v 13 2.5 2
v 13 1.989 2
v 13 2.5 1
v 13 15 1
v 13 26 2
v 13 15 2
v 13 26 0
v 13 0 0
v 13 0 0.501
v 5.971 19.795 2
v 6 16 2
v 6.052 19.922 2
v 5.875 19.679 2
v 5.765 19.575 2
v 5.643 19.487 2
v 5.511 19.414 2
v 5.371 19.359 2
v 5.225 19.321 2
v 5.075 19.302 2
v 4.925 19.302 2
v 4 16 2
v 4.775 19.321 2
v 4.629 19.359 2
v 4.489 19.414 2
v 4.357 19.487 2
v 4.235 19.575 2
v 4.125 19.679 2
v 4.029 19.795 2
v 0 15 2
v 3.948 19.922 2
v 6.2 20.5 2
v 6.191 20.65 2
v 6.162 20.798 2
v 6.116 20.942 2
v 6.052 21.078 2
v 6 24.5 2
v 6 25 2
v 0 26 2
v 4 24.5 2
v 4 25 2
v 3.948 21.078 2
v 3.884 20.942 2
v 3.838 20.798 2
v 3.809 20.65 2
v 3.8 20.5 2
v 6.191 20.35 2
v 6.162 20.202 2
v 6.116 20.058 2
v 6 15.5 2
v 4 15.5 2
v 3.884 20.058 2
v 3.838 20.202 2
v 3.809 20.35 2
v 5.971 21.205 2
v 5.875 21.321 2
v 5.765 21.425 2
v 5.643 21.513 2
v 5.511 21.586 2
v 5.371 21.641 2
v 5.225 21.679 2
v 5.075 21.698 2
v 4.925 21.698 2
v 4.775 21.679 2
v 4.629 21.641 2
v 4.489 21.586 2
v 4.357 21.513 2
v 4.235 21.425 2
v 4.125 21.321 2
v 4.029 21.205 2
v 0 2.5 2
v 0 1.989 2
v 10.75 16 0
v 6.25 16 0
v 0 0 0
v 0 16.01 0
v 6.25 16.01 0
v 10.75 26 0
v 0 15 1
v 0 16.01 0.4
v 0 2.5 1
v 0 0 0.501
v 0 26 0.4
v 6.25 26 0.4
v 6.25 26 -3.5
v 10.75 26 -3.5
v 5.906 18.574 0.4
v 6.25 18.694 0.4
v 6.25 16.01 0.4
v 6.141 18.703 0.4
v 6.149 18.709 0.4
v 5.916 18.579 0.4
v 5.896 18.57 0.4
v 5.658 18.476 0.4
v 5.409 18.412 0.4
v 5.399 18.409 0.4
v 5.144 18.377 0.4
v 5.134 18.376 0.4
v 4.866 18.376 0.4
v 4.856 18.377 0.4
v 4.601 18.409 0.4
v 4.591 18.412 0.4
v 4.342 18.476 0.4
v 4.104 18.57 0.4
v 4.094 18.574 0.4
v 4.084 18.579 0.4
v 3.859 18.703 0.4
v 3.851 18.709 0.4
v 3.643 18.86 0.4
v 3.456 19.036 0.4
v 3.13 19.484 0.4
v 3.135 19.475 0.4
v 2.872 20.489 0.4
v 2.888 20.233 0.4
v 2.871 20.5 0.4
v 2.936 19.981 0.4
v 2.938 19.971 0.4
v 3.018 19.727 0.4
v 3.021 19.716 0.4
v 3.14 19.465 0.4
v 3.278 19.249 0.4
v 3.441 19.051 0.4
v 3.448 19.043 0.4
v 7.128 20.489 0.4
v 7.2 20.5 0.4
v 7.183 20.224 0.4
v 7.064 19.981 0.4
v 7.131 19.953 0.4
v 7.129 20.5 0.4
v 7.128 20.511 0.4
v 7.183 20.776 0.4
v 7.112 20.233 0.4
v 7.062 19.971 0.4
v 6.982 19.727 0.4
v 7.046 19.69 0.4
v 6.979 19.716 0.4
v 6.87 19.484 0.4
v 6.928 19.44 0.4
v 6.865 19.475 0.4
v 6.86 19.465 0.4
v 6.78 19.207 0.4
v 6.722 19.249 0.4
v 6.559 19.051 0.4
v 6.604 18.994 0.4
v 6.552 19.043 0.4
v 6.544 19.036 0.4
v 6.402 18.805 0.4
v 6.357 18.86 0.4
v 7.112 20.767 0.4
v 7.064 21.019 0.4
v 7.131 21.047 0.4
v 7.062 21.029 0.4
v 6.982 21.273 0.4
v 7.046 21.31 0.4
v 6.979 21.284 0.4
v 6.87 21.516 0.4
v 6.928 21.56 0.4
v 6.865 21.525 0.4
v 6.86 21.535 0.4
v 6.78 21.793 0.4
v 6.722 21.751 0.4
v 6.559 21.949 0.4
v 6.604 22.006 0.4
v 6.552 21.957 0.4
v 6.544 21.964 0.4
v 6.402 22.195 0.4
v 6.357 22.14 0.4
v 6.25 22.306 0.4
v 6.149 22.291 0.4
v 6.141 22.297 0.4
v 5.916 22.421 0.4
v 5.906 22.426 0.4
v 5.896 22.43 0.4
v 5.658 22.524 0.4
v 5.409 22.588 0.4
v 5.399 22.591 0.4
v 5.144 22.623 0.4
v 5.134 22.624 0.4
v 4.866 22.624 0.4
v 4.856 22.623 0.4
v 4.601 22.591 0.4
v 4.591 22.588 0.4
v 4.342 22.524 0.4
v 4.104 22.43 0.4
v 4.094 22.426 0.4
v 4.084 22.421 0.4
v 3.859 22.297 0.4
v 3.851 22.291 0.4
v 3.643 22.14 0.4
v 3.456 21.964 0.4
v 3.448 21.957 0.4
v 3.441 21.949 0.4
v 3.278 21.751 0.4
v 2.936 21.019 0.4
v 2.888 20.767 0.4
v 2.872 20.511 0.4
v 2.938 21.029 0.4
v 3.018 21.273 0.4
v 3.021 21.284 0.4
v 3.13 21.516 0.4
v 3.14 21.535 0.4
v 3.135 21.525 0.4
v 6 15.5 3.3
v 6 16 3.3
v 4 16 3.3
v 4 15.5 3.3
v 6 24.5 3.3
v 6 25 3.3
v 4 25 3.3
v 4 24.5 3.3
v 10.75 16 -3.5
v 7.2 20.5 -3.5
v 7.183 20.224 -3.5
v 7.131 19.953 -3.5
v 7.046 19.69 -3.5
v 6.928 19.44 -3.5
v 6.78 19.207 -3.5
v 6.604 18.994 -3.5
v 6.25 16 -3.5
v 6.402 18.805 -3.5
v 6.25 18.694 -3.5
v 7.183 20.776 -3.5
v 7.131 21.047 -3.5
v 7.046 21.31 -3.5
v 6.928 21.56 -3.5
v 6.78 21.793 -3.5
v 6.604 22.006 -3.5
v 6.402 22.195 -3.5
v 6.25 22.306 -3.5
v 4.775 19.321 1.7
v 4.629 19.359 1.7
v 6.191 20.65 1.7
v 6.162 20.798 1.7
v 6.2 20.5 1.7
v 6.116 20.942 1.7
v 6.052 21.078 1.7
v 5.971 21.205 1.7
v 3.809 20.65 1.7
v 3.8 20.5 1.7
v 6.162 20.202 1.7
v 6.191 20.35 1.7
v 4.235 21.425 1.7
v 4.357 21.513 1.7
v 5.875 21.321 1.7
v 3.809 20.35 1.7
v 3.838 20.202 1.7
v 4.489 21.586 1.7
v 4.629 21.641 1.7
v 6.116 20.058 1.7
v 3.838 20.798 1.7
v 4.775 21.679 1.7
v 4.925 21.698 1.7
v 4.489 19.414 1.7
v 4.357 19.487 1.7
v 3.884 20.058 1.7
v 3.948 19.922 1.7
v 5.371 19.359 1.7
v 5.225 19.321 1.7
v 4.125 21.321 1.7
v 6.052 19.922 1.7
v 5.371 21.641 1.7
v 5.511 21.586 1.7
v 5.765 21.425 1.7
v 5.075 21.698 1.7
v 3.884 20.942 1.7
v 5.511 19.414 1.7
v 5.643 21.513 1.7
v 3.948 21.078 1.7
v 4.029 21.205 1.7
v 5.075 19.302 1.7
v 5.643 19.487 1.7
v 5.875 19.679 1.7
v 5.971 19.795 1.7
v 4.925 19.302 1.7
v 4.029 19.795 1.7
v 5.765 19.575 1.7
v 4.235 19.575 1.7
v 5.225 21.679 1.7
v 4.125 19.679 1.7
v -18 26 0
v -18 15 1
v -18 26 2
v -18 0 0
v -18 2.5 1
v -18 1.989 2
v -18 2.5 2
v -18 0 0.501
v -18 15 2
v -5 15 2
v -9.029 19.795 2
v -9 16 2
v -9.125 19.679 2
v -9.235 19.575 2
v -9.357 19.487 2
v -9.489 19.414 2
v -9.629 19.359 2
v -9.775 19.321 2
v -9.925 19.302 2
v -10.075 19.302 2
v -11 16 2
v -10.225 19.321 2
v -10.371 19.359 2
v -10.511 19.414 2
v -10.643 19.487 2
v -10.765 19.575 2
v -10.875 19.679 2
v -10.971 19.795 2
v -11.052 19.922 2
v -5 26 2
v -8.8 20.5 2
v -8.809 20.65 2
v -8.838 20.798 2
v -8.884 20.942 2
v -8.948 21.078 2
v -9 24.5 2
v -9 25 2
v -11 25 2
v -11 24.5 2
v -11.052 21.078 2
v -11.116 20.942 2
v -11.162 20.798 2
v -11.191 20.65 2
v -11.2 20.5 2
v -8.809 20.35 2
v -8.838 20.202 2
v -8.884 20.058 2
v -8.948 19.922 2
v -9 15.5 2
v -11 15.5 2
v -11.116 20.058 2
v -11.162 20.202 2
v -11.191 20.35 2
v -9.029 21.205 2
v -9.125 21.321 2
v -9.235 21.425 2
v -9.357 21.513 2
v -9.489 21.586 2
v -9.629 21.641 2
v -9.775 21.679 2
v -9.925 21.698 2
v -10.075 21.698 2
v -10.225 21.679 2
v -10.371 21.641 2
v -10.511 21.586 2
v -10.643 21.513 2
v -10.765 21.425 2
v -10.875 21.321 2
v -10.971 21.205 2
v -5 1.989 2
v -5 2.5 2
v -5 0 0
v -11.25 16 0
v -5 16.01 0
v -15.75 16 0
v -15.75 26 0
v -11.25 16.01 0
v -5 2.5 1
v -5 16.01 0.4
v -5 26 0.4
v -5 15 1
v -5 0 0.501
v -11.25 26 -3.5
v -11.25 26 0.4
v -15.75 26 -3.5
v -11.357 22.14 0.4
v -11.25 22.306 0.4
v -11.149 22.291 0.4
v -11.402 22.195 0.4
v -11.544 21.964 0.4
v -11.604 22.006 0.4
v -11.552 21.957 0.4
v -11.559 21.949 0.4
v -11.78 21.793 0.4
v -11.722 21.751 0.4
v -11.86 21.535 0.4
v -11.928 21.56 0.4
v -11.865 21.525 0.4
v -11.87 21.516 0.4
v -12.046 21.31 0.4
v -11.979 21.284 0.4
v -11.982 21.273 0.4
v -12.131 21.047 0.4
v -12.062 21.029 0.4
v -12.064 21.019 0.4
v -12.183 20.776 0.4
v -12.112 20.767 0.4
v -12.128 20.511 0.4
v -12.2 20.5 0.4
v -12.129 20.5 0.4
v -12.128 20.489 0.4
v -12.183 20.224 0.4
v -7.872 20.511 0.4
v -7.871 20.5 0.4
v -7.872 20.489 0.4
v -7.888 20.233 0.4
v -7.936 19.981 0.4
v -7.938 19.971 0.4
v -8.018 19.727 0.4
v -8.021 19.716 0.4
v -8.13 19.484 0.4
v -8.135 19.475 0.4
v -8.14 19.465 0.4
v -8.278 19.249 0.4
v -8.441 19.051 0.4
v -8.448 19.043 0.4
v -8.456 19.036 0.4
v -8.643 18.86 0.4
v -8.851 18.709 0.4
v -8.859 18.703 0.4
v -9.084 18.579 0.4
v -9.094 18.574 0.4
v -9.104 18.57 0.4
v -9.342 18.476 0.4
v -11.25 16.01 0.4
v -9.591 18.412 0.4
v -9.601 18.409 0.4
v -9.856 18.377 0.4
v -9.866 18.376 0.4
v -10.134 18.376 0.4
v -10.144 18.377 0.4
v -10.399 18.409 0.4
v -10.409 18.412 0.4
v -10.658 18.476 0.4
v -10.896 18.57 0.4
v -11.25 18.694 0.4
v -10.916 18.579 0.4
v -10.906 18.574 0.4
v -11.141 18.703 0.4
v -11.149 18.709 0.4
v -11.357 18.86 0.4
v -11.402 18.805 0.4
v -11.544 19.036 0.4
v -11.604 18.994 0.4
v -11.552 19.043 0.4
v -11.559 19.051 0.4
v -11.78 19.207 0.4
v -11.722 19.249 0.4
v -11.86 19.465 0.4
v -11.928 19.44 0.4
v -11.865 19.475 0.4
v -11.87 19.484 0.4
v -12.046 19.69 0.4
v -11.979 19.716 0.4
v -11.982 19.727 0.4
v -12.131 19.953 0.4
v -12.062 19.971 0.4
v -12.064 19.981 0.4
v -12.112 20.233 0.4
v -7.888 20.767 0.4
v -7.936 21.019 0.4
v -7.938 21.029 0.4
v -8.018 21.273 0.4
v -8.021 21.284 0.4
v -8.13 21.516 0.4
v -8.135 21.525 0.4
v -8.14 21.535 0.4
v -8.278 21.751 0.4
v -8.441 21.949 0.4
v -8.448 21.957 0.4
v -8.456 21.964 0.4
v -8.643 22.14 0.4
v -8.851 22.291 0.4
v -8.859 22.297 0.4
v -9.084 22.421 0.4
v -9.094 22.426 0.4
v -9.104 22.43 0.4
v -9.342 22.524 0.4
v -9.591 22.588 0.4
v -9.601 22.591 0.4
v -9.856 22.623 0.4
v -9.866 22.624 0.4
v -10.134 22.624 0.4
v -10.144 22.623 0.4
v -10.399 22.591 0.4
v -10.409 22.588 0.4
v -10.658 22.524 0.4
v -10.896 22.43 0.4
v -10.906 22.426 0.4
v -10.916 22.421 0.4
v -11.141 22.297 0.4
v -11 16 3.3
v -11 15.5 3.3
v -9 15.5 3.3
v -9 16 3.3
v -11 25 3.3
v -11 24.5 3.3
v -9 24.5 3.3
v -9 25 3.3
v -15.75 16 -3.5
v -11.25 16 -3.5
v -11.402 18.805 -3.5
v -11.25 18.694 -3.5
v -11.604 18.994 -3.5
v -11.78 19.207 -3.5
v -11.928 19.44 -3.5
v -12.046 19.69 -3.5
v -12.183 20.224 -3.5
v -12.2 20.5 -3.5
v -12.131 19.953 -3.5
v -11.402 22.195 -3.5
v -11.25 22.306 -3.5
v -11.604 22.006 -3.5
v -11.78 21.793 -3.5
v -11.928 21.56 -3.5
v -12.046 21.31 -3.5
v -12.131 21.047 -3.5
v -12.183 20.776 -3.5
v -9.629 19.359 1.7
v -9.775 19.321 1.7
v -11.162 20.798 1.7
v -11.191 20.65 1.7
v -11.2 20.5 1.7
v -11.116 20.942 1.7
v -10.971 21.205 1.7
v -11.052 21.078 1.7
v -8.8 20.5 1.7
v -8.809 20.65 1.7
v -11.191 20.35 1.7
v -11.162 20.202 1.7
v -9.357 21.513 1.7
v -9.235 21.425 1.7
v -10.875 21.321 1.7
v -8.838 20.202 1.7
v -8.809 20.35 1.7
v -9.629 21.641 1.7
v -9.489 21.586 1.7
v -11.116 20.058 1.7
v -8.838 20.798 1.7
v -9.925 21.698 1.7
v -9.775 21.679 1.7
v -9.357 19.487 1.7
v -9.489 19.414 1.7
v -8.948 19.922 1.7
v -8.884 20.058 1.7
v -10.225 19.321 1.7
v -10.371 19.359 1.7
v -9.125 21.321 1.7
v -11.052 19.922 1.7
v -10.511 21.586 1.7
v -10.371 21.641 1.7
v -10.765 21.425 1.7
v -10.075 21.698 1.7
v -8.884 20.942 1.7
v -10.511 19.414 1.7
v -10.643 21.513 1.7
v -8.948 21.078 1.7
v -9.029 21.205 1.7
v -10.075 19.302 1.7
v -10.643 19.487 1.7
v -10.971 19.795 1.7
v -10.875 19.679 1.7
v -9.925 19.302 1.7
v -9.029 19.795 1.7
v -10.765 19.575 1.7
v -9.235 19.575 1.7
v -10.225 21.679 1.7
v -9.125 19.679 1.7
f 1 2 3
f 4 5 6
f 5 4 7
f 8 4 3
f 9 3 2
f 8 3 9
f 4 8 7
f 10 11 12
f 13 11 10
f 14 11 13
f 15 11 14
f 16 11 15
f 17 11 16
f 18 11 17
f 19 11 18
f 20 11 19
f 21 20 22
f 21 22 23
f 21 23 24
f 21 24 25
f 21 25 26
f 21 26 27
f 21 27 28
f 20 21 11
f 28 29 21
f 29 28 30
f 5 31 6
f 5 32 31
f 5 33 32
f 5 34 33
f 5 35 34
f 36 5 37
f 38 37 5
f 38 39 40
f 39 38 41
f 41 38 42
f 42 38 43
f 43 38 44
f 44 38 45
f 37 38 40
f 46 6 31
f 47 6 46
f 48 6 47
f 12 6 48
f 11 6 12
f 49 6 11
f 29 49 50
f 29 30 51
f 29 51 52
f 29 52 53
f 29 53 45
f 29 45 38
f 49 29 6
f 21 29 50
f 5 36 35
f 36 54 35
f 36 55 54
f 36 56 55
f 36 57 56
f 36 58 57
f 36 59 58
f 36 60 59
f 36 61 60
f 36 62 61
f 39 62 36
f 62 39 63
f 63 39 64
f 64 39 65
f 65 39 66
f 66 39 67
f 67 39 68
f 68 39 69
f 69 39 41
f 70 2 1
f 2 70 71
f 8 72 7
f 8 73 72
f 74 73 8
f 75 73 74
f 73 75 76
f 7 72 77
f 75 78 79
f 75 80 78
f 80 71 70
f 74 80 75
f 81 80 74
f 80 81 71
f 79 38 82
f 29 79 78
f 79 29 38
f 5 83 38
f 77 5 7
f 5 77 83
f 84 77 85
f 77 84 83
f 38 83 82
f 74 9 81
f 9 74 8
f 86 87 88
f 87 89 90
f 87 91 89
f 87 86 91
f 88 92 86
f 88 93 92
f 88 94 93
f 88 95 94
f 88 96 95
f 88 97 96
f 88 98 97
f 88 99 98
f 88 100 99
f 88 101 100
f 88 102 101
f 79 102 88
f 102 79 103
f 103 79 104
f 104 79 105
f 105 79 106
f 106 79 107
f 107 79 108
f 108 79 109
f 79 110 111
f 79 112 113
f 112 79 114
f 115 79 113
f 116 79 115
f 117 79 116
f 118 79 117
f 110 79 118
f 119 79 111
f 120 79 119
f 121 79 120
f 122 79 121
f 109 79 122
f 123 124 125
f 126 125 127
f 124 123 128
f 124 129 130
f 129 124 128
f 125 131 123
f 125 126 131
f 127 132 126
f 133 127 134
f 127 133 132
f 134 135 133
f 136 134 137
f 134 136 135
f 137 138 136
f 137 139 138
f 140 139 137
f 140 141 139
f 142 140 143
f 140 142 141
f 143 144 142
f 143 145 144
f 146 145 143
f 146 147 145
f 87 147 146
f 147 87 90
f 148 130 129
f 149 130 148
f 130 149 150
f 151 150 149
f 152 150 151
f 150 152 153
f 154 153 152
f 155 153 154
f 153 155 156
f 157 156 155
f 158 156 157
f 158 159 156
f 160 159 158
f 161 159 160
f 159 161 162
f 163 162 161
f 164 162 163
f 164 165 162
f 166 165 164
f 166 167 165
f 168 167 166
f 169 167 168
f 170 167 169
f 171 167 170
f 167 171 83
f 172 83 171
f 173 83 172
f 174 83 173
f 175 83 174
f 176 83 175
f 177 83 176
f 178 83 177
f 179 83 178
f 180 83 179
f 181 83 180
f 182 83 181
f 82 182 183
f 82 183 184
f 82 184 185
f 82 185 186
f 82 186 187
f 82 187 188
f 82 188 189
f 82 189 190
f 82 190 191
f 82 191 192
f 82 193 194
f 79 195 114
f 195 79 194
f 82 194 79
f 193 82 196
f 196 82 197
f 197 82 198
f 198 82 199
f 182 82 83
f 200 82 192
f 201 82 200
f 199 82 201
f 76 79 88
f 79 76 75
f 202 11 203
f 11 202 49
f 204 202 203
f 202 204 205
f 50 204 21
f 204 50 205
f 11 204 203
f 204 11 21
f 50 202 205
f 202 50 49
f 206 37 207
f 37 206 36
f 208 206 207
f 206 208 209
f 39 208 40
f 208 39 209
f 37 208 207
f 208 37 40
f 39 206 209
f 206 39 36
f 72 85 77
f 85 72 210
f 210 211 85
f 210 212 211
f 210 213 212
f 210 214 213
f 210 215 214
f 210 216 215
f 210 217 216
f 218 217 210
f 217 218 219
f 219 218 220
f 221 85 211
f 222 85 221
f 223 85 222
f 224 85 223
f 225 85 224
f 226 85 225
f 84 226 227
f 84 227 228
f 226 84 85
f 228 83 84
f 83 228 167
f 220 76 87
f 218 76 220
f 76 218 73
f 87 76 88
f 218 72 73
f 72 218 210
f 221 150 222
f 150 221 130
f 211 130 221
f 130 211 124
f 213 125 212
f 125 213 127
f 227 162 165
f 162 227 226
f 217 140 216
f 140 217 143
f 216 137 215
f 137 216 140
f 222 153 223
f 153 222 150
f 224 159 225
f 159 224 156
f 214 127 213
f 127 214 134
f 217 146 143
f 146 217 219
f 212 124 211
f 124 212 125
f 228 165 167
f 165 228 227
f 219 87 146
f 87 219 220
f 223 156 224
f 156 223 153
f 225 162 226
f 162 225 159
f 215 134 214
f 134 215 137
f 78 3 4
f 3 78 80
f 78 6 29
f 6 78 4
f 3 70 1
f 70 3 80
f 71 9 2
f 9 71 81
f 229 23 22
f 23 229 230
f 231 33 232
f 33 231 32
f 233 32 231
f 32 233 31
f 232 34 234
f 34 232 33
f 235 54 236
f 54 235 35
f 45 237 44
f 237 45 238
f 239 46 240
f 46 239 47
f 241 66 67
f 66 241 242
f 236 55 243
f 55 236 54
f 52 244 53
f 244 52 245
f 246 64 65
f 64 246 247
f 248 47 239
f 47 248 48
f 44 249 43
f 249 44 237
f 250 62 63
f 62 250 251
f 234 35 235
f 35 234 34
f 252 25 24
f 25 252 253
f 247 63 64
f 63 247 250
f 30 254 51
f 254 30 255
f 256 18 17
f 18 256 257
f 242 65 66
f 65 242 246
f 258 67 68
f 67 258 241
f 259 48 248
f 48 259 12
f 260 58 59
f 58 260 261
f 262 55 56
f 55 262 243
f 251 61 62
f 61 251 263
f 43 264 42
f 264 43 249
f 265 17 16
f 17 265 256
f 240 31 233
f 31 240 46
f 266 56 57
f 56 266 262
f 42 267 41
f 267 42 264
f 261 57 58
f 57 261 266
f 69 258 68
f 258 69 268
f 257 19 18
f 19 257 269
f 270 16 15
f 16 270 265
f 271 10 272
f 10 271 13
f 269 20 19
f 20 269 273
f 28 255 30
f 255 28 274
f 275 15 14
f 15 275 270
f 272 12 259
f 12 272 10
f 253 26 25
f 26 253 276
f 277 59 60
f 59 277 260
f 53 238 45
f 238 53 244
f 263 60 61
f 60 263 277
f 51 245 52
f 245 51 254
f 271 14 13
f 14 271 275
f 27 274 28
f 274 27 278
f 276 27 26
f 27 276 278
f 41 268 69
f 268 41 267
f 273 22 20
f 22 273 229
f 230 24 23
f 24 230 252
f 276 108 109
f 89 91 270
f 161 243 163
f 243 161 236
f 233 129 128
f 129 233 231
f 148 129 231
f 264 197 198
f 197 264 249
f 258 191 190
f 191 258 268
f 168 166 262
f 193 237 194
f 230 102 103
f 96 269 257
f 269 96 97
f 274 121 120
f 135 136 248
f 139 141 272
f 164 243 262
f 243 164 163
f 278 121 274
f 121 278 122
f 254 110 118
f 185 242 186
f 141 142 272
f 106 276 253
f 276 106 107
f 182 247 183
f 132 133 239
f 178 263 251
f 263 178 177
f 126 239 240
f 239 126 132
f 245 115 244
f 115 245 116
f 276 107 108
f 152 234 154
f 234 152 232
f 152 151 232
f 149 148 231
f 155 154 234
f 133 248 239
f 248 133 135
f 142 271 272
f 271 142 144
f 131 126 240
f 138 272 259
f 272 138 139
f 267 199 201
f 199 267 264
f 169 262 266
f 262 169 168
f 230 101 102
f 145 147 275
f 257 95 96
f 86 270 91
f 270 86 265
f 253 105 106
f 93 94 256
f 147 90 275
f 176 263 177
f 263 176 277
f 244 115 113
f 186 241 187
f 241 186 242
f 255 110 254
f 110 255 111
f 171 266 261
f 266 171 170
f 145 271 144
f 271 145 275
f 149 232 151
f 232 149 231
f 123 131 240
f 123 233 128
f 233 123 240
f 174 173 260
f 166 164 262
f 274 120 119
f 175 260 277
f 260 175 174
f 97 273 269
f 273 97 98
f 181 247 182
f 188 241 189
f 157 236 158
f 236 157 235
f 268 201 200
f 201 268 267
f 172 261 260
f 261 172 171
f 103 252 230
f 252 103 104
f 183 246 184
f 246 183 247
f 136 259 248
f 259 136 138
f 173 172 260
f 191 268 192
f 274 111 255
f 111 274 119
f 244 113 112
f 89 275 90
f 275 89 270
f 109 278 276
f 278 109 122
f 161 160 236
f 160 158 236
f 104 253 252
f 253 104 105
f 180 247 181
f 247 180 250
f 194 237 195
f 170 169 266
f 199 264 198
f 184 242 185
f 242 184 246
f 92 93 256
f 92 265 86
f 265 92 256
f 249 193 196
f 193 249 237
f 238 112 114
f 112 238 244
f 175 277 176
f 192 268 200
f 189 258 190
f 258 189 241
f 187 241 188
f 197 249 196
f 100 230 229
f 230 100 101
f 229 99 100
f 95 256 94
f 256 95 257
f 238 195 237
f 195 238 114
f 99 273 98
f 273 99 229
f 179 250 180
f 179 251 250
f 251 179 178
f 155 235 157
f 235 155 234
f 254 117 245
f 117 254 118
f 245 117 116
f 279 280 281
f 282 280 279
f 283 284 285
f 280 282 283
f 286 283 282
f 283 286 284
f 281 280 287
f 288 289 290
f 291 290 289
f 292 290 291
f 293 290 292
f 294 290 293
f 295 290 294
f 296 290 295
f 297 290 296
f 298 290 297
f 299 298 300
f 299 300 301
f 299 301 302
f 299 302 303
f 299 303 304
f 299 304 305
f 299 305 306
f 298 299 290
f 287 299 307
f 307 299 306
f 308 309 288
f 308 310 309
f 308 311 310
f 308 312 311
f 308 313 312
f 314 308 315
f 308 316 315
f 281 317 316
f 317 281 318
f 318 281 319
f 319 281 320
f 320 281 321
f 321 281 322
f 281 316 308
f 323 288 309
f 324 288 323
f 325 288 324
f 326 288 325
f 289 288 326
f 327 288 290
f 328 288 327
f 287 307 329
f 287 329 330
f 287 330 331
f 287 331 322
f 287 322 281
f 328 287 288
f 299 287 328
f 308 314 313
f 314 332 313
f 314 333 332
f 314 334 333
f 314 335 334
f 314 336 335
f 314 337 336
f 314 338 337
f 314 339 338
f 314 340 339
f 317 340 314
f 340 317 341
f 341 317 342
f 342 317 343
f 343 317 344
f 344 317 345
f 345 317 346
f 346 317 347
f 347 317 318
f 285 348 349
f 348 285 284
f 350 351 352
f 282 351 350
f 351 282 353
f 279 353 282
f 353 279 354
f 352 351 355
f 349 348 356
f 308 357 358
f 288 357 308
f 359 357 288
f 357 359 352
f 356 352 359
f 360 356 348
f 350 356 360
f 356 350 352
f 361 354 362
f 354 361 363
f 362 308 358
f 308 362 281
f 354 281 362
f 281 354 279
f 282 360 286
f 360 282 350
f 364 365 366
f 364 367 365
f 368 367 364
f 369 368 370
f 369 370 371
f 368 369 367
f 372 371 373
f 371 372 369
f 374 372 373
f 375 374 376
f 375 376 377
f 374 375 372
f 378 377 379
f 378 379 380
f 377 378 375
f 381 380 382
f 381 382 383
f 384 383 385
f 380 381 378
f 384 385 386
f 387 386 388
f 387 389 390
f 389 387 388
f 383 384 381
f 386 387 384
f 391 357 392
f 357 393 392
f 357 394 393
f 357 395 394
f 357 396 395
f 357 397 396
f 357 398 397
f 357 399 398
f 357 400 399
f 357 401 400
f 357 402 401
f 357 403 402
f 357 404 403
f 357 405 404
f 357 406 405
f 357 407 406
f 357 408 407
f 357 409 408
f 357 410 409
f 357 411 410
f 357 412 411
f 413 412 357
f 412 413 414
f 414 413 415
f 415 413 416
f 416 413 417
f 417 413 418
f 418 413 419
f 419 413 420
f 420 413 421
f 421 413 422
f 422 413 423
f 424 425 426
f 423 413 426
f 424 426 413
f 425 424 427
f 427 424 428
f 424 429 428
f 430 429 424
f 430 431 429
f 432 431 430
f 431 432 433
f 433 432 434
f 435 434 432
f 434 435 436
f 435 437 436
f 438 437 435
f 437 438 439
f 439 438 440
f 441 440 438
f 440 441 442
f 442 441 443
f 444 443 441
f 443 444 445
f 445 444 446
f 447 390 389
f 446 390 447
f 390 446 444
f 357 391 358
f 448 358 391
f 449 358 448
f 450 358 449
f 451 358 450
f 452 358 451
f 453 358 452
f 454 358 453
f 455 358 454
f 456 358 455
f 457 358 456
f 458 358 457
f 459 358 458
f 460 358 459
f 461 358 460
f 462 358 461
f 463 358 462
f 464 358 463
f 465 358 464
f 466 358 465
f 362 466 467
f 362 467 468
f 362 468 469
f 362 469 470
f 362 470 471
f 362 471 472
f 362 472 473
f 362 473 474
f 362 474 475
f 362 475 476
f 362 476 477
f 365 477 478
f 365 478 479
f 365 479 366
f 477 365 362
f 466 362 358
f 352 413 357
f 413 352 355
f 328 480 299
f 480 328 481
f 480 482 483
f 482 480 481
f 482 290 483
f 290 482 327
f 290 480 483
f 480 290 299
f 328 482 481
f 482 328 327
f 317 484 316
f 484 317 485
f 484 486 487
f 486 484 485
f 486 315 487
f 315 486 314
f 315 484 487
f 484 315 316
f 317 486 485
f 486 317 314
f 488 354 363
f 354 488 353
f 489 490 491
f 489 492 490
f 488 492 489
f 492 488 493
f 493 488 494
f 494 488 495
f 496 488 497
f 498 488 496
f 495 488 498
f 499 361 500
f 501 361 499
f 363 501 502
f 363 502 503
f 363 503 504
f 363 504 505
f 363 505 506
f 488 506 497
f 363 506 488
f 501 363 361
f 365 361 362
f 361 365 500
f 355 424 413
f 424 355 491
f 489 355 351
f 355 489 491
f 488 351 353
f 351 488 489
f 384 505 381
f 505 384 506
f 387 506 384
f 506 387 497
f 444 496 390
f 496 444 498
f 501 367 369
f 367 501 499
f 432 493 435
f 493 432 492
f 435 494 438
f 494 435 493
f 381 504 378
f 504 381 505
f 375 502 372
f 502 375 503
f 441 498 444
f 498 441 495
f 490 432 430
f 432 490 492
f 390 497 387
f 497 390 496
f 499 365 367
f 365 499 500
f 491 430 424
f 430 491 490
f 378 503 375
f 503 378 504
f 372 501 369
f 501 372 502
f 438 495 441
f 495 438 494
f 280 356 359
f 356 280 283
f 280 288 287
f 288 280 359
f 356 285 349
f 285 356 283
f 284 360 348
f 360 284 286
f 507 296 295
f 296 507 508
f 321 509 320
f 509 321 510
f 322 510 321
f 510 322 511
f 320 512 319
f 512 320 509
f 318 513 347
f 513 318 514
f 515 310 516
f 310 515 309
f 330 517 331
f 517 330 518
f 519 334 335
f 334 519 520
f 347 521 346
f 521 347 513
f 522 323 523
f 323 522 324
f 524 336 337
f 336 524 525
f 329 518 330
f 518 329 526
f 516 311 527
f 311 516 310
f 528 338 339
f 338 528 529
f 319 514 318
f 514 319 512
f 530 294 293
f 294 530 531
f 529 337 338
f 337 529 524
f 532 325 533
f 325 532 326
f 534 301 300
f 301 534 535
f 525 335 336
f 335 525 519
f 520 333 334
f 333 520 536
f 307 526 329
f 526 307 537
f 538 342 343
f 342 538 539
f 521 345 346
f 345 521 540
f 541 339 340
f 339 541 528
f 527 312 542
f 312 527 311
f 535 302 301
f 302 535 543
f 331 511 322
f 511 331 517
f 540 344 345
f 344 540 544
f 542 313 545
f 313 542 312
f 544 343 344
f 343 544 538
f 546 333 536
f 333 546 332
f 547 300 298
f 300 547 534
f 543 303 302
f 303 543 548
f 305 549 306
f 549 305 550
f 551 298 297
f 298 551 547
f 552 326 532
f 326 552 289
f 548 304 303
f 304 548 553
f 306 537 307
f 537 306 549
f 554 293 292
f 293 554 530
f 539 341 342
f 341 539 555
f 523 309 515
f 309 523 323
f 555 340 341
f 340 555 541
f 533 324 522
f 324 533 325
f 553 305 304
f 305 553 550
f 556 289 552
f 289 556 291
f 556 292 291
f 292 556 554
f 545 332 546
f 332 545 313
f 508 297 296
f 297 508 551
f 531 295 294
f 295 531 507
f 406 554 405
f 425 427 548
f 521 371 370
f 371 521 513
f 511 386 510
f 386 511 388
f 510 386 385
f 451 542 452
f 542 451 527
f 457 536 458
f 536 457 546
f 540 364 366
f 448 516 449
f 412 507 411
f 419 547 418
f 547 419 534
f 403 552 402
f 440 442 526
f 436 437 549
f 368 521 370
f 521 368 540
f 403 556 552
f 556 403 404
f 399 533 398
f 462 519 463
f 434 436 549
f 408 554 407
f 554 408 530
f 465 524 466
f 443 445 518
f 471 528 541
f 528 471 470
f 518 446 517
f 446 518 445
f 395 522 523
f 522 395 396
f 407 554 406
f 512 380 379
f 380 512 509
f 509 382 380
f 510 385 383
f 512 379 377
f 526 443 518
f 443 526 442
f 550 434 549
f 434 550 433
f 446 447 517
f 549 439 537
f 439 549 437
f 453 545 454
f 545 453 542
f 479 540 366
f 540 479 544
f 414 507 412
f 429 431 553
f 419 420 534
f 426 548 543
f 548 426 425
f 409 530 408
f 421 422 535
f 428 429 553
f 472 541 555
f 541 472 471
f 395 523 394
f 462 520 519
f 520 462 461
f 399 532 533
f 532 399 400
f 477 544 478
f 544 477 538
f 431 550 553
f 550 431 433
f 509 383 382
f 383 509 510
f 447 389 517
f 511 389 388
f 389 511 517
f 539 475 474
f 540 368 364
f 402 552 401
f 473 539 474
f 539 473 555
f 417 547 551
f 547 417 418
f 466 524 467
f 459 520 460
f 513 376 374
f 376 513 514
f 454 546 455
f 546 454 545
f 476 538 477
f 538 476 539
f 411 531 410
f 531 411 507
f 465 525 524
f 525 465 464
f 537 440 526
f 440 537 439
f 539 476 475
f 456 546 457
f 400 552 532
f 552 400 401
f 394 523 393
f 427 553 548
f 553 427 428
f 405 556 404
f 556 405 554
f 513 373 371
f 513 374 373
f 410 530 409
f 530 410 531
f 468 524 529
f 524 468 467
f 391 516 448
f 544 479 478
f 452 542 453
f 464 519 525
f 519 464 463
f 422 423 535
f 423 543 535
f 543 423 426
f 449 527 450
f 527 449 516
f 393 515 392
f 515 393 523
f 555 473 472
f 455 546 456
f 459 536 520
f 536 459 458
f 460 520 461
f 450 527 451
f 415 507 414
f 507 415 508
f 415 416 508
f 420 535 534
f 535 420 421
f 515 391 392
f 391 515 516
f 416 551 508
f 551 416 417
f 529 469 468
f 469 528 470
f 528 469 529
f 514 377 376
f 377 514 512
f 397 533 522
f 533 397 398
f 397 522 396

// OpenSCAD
$fa = 1;
$fs = 0.5;
$fn = 50;

module clip() {
  difference() {
    union() {
      difference() {
        // main slab
        cube([13,26,2]);
        // Slight cutaway by screwhole
        translate([-0.01,16.01,-0.1]) cube([10,10,0.5]);
      }
      translate([4,15.5,2]) {
        translate([0,0,-0.5]) cube([2,0.5,1.8]);
        translate([0,9,-0.5]) cube([2,0.5,1.8]);
      }
      translate([8-2,17-1,-4]) {
        difference() {
          translate([0.25,0,0.5]) cube([4.5,10,4.5]);
          // Screw cutout
          translate([-1,4.5,-1]) cylinder(8,2.2,2.2);
        }
      }
    }
    // snap leg
    translate([-0.5,2.5,1]) cube([14,12.5,2]);
    rotate([37,0,0]) translate([-0.5,0,0.4]) cube([14,12.5,5]);
    // screw hole
    translate([5,20.5,-2]) cylinder(6,1.2,1.2);
    // Skirt for flush screw
    translate([5,20.5,0.3]) cylinder(1.4,2.2,1.2);
  }
}

// Probably generate one at a time
// Right-hand side clip.
clip();

// Left-hand side clip.
translate([-5,0,0]) mirror([1,0,0]) clip();
